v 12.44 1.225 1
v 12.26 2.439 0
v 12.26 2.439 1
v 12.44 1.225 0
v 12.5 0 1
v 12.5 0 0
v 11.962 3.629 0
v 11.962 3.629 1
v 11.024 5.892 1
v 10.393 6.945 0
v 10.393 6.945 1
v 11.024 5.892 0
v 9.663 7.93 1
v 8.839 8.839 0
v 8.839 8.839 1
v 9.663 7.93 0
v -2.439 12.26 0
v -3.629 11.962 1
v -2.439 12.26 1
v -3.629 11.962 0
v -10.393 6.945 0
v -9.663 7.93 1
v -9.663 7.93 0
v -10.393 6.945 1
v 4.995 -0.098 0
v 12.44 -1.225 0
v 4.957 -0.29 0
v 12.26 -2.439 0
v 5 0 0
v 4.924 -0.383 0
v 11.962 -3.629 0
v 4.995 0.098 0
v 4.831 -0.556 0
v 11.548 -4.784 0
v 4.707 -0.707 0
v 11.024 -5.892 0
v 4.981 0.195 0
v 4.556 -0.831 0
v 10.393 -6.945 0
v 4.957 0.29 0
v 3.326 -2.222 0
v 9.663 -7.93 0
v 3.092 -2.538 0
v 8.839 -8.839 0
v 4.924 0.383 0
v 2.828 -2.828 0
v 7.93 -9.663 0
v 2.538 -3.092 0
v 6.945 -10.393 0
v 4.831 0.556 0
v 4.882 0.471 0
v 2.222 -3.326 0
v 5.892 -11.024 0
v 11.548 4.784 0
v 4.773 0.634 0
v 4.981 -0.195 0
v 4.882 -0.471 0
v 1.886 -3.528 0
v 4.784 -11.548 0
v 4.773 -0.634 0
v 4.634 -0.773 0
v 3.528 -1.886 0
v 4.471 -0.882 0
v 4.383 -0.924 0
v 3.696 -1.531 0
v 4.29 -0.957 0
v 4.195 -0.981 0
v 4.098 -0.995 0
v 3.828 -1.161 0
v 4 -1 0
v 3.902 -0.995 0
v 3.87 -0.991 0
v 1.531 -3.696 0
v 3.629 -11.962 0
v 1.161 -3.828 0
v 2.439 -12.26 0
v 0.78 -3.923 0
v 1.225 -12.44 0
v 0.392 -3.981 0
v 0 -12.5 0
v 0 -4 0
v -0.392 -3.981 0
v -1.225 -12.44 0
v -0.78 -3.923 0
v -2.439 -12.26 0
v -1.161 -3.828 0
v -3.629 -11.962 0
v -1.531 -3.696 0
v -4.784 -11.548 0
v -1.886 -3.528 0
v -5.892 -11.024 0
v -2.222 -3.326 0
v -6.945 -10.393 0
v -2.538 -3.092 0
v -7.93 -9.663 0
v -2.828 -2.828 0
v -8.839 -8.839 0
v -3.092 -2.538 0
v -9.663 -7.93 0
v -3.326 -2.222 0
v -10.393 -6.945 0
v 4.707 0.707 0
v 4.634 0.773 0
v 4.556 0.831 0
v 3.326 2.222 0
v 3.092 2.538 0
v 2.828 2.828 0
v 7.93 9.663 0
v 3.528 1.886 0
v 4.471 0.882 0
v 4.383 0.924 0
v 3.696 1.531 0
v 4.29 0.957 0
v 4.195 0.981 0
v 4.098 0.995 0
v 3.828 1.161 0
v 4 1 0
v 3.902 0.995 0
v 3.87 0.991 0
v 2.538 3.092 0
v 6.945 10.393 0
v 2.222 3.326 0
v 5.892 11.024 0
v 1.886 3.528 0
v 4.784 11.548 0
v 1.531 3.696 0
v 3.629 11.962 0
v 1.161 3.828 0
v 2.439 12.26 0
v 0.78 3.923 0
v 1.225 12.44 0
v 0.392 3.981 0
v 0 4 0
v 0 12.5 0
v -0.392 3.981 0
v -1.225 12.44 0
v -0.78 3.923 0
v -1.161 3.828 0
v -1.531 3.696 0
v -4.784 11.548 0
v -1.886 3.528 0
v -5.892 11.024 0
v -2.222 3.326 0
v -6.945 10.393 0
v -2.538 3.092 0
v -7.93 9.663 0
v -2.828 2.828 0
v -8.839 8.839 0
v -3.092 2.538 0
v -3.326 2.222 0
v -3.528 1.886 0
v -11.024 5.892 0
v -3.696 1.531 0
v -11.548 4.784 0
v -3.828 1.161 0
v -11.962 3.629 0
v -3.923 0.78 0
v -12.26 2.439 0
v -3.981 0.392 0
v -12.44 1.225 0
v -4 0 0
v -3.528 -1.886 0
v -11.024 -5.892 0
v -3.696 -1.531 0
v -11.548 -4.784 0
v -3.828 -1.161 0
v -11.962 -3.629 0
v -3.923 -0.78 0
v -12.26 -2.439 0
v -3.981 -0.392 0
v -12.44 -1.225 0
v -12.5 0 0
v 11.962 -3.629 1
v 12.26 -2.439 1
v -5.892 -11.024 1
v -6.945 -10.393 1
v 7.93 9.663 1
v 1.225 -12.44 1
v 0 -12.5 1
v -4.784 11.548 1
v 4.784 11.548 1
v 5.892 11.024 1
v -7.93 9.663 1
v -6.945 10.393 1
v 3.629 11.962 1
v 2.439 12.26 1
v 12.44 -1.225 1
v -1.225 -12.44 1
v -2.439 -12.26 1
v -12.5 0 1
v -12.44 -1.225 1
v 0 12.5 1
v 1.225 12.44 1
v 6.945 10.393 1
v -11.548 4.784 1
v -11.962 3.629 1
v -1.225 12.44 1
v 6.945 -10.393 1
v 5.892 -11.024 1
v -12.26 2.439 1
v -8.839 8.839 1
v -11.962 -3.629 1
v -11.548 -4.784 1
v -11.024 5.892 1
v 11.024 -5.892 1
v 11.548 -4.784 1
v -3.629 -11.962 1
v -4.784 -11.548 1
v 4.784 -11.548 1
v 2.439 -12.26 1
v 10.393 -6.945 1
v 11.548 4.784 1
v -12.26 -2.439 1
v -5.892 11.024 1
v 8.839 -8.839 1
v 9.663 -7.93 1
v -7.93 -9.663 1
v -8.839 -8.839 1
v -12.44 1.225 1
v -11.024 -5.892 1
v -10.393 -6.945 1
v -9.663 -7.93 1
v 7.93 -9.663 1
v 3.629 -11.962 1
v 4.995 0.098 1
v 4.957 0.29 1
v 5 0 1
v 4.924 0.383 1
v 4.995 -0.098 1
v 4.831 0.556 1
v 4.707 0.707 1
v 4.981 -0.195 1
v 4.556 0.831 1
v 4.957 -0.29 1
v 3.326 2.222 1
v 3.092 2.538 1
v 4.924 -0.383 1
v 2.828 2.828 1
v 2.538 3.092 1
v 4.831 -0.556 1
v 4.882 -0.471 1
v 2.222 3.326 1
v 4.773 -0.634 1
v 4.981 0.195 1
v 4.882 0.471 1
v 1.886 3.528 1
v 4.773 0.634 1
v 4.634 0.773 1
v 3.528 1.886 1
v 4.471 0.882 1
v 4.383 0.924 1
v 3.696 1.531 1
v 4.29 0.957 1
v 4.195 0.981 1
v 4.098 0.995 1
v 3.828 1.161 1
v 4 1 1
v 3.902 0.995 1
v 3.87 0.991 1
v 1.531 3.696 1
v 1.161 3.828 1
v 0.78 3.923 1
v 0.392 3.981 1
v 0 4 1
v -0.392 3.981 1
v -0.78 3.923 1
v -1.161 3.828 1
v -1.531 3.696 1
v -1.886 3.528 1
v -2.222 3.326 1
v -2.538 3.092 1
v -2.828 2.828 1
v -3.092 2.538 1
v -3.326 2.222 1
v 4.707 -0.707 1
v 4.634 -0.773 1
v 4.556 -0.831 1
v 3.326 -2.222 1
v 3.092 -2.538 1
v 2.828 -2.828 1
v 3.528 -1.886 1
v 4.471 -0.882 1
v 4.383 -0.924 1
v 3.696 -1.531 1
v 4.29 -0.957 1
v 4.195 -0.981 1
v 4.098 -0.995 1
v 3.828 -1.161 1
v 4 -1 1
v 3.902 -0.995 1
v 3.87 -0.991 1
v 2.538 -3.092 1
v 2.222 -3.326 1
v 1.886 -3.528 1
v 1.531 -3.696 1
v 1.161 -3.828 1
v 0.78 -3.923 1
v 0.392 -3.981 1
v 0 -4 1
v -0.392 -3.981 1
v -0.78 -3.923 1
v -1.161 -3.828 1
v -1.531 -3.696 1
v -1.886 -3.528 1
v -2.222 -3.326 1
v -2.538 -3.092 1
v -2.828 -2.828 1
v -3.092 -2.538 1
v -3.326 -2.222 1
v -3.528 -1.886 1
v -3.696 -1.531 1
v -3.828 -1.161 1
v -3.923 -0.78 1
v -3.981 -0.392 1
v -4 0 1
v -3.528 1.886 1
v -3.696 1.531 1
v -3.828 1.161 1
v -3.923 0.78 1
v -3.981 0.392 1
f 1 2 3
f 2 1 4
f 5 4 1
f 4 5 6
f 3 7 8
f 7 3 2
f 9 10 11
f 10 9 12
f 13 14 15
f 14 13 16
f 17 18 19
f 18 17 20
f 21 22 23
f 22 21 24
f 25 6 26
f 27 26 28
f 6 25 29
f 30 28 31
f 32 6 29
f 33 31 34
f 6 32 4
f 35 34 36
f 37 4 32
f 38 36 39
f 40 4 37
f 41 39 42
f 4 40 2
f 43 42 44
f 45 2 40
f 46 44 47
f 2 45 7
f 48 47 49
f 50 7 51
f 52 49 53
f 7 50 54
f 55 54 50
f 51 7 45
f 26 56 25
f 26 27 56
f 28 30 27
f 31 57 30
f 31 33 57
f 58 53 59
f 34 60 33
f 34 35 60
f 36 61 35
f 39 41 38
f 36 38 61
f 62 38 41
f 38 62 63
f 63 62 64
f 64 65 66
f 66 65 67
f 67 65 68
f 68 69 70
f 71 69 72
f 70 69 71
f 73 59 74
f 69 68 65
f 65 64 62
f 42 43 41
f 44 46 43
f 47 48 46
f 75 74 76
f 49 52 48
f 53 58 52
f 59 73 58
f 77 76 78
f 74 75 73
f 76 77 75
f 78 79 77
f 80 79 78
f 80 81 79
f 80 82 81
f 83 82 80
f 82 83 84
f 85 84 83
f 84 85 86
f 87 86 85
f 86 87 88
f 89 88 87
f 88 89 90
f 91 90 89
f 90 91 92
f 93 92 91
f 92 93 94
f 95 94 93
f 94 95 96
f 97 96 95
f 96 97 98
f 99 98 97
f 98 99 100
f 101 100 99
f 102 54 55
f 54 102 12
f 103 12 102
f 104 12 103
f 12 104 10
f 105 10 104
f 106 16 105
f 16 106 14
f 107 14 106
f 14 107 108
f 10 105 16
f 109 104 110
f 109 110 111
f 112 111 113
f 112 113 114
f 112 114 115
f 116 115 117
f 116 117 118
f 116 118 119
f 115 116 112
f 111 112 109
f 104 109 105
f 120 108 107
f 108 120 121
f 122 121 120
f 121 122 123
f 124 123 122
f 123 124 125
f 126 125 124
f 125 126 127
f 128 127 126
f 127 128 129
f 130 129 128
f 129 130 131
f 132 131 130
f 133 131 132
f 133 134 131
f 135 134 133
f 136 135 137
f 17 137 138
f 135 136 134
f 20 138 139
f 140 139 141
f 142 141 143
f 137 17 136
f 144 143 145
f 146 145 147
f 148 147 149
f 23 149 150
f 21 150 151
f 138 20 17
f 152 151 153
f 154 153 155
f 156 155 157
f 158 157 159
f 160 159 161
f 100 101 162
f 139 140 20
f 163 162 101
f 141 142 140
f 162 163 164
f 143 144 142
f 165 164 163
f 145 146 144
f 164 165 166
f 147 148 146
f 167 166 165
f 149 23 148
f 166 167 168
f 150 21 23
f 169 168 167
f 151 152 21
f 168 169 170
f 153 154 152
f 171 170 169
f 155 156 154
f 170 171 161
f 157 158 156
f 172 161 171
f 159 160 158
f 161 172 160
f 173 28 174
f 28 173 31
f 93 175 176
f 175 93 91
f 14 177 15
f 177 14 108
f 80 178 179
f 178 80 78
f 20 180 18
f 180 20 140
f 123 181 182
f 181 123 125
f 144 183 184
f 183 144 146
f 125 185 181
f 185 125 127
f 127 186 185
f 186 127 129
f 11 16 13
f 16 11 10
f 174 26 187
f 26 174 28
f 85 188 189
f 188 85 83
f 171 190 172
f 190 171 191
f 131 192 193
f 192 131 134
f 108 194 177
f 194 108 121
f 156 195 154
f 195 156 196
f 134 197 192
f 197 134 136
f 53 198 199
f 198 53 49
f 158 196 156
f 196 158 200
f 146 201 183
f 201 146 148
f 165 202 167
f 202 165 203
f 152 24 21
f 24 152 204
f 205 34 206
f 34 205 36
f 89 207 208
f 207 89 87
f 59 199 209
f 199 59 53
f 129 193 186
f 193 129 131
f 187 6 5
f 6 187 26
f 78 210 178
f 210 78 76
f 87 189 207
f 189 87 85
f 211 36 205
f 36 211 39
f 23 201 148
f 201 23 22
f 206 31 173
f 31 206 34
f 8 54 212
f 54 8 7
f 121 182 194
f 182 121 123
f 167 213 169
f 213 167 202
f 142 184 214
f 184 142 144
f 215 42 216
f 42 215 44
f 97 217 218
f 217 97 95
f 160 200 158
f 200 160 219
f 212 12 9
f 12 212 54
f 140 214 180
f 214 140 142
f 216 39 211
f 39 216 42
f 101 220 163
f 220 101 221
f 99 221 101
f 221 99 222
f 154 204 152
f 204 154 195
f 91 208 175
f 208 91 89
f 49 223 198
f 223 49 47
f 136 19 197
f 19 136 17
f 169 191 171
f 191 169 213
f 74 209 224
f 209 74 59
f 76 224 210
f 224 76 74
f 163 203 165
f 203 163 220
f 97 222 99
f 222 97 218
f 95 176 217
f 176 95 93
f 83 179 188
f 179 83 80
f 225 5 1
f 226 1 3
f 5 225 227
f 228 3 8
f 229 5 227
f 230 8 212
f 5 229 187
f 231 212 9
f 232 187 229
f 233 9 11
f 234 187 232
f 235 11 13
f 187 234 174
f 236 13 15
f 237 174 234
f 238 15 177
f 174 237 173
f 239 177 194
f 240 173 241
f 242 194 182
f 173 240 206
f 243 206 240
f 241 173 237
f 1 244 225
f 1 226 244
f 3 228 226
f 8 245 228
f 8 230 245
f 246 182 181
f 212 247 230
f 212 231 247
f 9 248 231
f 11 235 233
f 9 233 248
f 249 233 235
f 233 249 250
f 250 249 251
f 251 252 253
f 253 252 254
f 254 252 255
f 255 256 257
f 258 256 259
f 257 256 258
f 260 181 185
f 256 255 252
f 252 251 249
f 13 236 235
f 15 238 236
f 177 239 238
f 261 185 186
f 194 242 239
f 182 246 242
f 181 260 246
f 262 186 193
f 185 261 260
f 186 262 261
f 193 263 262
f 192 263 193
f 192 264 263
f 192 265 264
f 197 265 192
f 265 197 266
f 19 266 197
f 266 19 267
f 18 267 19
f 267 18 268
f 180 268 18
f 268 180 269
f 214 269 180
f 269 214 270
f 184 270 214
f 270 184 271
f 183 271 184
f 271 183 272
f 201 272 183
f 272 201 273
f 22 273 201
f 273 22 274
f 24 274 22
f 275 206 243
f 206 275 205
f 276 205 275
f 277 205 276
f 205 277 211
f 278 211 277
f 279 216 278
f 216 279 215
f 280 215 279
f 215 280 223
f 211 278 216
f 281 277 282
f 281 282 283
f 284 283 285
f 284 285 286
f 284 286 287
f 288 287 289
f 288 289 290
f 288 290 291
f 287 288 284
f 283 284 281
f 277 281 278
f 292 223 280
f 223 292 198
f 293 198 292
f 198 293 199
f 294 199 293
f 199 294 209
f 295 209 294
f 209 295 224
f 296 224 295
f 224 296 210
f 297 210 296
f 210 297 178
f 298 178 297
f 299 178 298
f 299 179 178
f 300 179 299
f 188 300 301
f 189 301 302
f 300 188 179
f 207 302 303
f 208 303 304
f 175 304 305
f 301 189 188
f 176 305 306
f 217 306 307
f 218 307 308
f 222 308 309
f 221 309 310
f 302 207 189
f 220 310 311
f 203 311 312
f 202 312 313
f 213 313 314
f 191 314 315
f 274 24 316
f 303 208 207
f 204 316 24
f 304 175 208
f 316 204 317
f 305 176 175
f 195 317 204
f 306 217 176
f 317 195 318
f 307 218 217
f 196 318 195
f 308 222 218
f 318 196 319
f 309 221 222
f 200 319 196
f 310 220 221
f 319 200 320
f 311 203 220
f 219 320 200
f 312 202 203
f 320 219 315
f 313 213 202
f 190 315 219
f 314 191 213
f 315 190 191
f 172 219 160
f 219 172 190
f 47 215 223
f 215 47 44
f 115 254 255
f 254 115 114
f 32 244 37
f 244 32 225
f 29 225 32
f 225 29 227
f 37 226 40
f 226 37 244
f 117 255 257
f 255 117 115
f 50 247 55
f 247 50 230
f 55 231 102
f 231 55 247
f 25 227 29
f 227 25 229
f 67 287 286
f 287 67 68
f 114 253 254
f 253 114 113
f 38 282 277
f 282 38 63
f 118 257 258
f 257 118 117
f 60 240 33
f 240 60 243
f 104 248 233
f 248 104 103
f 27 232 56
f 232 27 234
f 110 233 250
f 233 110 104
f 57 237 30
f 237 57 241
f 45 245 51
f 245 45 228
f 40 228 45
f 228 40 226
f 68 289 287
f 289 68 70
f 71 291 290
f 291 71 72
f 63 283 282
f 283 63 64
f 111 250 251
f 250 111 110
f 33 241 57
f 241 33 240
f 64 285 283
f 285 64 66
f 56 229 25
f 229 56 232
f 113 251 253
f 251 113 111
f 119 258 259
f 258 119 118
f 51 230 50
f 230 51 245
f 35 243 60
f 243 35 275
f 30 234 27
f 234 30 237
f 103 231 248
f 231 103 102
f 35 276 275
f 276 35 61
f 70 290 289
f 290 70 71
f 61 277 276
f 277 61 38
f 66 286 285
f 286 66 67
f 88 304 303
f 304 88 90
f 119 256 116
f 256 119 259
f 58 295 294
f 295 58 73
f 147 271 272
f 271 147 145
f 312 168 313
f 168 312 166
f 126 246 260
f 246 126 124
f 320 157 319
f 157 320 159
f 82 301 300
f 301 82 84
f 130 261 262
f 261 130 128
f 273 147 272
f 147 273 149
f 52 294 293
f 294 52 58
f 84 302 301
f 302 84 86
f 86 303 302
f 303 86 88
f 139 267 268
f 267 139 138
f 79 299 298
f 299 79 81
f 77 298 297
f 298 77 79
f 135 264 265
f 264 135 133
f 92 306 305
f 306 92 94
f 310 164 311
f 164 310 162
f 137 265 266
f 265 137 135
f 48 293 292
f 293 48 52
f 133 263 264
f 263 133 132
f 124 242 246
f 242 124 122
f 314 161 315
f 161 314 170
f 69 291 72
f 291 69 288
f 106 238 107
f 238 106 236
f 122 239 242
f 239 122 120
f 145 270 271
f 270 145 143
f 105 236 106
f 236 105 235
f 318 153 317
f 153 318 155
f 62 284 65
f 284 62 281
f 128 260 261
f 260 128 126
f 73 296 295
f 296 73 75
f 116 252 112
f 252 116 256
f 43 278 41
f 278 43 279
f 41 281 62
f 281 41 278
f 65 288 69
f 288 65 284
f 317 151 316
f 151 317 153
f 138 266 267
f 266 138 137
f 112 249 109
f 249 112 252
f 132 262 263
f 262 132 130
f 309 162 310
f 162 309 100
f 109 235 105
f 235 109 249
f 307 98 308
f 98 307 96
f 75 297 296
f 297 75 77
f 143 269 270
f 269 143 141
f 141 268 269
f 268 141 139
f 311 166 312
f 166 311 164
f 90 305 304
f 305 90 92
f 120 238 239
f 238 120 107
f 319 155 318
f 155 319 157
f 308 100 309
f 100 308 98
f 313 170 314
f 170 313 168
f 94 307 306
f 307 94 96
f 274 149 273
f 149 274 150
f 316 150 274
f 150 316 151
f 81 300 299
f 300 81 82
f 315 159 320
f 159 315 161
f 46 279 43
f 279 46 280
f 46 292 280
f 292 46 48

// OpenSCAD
// file: parts.scad
/**
 * Martin Egli
 * 2021-12-04
 * parts for vibra alarm 2
 */

module battery() {
    color("Silver")
    translate([0, 0, 0])
    cube([40, 22, 9]);
    color("Yellow")
    translate([40, 0, 0])
    cube([6, 22, 5]);
}

module chargerPCB() {
    color("Silver")
    translate([-2, (19-8)/2, 1])
    cube([6, 8, 3]);
    color("Blue")
    translate([0, 0, 0])
    cube([25, 19, 2]);
}

module arduinoMicroProPCB() {
    color("Silver")
    for(n = [0:1:5]) {
        translate([-13, 1+2.54/2+n*2.54, 1.75])
        cube([14, 1, 1]);
    }
    color("Black")
    translate([-1, 1, 1])
    cube([2.5, 16, 2.5]);
    color("Black")
    translate([15, 9.5, 1])
    rotate([0, 0, -45])
    cube([8, 8, 2]);
    color("Blue")
    translate([0, 0, 0])
    cube([34, 19, 2]);
}

module displayPCB() {
    color("Blue")
    translate([0, 0, 0])
    cube([27, 28, 1]);
    color("White")
    translate([0, 4.5, 0])
    cube([27, 19, 1.5]);
}

module displayPCB2_25x27(loc_res = 32) {
    difference() {
        union() {
            color("Gray") // Black
            translate([0, 0, 0])
            cube([25, 27, 1]);
            color("White")
            translate([0, 5, 0])
            cube([25, 17, 1.5]);
            
            color("Silver") {
                translate([8.5, 27-1.7, -0.1])
                cylinder(d = 2, h = 1.2, $fn = loc_res);
                translate([8.5+1*2.54, 27-1.7, -0.1])
                cylinder(d = 2, h = 1.2, $fn = loc_res);
                translate([8.5+2*2.54, 27-1.7, -0.1])
                cylinder(d = 2, h = 1.2, $fn = loc_res);
                translate([8.5+3*2.54, 27-1.7, -0.1])
                cylinder(d = 2, h = 1.2, $fn = loc_res);
            }
        }
        // m3 holes
        translate([2, 2, -1])
        cylinder(d = 3, h = 4, $fn = loc_res);
        translate([25-2, 2, -1])
        cylinder(d = 3, h = 4, $fn = loc_res);
        translate([2, 27-2, -1])
        cylinder(d = 3, h = 4, $fn = loc_res);
        translate([25-2, 27-2, -1])
        cylinder(d = 3, h = 4, $fn = loc_res);
    }
}

module switch() {
    color("Gray")
    translate([0, 0, 0])
    cube([17, 13, 12]);
    color("Gray")
    translate([-2, -2, 12])
    cube([17+4, 13+4, 2]);
    color("Red")
    translate([1.5, 1.5, 14])
    rotate([0, 15, 0])
    cube([14, 10, 4]);
    color("Silver")
    translate([0.5, (13-5)/2,-7])
    cube([1, 5, 7]);
    color("Silver")
    translate([17/2-0.5, (13-5)/2,-7])
    cube([1, 5, 7]);
}

module vibraMotor() {
    color("Silver")
    cylinder(d = 10, h = 3, $fn = 32);
}

displayPCB2_25x27();
// main file
/**
 * Martin Egli
 * 2021-12-04
 * 3d parts for hot wire game, wire contacts
 */
 
use <parts.scad>

module endcontacts(loc_res = 32) {
    difference() {
        translate([0, 0, 0])
        cylinder(d = 25, h= 1, $fn = loc_res);
        
        translate([4, 0, -1])
        cylinder(d = 2, h= 3, $fn = loc_res);
        translate([0, 0, -1])
        cylinder(d = 8, h= 3, $fn = loc_res);
    }
}

module wireholder(loc_res = 32) {
    difference() {
        union() {
            translate([0, 0, 1])
            cylinder(d = 12, h= 1, $fn = loc_res);
            translate([0, 0, 2])
            cylinder(d1 = 12, d2 = 3.85, h= 10, $fn = loc_res);
            translate([0, 0, 11.5])
            sphere(d = 4, $fn = loc_res);
            translate([0, 0, -10])
            cylinder(d = 8, h= 13, $fn = loc_res);
        }
        #hull() {
            translate([4, 0, -11])
            sphere(d = 2, $fn = loc_res);
            translate([4, 0, 1])
            sphere(d = 2, $fn = loc_res);
            translate([10, 0, 1])
            sphere(d = 2, $fn = loc_res);
        }
        translate([0, 0, -11])
        cylinder(d = 2, h= 25, $fn = loc_res);
    }
}

endcontacts(64); // 2 x
//wireholder(64); // 2 x
